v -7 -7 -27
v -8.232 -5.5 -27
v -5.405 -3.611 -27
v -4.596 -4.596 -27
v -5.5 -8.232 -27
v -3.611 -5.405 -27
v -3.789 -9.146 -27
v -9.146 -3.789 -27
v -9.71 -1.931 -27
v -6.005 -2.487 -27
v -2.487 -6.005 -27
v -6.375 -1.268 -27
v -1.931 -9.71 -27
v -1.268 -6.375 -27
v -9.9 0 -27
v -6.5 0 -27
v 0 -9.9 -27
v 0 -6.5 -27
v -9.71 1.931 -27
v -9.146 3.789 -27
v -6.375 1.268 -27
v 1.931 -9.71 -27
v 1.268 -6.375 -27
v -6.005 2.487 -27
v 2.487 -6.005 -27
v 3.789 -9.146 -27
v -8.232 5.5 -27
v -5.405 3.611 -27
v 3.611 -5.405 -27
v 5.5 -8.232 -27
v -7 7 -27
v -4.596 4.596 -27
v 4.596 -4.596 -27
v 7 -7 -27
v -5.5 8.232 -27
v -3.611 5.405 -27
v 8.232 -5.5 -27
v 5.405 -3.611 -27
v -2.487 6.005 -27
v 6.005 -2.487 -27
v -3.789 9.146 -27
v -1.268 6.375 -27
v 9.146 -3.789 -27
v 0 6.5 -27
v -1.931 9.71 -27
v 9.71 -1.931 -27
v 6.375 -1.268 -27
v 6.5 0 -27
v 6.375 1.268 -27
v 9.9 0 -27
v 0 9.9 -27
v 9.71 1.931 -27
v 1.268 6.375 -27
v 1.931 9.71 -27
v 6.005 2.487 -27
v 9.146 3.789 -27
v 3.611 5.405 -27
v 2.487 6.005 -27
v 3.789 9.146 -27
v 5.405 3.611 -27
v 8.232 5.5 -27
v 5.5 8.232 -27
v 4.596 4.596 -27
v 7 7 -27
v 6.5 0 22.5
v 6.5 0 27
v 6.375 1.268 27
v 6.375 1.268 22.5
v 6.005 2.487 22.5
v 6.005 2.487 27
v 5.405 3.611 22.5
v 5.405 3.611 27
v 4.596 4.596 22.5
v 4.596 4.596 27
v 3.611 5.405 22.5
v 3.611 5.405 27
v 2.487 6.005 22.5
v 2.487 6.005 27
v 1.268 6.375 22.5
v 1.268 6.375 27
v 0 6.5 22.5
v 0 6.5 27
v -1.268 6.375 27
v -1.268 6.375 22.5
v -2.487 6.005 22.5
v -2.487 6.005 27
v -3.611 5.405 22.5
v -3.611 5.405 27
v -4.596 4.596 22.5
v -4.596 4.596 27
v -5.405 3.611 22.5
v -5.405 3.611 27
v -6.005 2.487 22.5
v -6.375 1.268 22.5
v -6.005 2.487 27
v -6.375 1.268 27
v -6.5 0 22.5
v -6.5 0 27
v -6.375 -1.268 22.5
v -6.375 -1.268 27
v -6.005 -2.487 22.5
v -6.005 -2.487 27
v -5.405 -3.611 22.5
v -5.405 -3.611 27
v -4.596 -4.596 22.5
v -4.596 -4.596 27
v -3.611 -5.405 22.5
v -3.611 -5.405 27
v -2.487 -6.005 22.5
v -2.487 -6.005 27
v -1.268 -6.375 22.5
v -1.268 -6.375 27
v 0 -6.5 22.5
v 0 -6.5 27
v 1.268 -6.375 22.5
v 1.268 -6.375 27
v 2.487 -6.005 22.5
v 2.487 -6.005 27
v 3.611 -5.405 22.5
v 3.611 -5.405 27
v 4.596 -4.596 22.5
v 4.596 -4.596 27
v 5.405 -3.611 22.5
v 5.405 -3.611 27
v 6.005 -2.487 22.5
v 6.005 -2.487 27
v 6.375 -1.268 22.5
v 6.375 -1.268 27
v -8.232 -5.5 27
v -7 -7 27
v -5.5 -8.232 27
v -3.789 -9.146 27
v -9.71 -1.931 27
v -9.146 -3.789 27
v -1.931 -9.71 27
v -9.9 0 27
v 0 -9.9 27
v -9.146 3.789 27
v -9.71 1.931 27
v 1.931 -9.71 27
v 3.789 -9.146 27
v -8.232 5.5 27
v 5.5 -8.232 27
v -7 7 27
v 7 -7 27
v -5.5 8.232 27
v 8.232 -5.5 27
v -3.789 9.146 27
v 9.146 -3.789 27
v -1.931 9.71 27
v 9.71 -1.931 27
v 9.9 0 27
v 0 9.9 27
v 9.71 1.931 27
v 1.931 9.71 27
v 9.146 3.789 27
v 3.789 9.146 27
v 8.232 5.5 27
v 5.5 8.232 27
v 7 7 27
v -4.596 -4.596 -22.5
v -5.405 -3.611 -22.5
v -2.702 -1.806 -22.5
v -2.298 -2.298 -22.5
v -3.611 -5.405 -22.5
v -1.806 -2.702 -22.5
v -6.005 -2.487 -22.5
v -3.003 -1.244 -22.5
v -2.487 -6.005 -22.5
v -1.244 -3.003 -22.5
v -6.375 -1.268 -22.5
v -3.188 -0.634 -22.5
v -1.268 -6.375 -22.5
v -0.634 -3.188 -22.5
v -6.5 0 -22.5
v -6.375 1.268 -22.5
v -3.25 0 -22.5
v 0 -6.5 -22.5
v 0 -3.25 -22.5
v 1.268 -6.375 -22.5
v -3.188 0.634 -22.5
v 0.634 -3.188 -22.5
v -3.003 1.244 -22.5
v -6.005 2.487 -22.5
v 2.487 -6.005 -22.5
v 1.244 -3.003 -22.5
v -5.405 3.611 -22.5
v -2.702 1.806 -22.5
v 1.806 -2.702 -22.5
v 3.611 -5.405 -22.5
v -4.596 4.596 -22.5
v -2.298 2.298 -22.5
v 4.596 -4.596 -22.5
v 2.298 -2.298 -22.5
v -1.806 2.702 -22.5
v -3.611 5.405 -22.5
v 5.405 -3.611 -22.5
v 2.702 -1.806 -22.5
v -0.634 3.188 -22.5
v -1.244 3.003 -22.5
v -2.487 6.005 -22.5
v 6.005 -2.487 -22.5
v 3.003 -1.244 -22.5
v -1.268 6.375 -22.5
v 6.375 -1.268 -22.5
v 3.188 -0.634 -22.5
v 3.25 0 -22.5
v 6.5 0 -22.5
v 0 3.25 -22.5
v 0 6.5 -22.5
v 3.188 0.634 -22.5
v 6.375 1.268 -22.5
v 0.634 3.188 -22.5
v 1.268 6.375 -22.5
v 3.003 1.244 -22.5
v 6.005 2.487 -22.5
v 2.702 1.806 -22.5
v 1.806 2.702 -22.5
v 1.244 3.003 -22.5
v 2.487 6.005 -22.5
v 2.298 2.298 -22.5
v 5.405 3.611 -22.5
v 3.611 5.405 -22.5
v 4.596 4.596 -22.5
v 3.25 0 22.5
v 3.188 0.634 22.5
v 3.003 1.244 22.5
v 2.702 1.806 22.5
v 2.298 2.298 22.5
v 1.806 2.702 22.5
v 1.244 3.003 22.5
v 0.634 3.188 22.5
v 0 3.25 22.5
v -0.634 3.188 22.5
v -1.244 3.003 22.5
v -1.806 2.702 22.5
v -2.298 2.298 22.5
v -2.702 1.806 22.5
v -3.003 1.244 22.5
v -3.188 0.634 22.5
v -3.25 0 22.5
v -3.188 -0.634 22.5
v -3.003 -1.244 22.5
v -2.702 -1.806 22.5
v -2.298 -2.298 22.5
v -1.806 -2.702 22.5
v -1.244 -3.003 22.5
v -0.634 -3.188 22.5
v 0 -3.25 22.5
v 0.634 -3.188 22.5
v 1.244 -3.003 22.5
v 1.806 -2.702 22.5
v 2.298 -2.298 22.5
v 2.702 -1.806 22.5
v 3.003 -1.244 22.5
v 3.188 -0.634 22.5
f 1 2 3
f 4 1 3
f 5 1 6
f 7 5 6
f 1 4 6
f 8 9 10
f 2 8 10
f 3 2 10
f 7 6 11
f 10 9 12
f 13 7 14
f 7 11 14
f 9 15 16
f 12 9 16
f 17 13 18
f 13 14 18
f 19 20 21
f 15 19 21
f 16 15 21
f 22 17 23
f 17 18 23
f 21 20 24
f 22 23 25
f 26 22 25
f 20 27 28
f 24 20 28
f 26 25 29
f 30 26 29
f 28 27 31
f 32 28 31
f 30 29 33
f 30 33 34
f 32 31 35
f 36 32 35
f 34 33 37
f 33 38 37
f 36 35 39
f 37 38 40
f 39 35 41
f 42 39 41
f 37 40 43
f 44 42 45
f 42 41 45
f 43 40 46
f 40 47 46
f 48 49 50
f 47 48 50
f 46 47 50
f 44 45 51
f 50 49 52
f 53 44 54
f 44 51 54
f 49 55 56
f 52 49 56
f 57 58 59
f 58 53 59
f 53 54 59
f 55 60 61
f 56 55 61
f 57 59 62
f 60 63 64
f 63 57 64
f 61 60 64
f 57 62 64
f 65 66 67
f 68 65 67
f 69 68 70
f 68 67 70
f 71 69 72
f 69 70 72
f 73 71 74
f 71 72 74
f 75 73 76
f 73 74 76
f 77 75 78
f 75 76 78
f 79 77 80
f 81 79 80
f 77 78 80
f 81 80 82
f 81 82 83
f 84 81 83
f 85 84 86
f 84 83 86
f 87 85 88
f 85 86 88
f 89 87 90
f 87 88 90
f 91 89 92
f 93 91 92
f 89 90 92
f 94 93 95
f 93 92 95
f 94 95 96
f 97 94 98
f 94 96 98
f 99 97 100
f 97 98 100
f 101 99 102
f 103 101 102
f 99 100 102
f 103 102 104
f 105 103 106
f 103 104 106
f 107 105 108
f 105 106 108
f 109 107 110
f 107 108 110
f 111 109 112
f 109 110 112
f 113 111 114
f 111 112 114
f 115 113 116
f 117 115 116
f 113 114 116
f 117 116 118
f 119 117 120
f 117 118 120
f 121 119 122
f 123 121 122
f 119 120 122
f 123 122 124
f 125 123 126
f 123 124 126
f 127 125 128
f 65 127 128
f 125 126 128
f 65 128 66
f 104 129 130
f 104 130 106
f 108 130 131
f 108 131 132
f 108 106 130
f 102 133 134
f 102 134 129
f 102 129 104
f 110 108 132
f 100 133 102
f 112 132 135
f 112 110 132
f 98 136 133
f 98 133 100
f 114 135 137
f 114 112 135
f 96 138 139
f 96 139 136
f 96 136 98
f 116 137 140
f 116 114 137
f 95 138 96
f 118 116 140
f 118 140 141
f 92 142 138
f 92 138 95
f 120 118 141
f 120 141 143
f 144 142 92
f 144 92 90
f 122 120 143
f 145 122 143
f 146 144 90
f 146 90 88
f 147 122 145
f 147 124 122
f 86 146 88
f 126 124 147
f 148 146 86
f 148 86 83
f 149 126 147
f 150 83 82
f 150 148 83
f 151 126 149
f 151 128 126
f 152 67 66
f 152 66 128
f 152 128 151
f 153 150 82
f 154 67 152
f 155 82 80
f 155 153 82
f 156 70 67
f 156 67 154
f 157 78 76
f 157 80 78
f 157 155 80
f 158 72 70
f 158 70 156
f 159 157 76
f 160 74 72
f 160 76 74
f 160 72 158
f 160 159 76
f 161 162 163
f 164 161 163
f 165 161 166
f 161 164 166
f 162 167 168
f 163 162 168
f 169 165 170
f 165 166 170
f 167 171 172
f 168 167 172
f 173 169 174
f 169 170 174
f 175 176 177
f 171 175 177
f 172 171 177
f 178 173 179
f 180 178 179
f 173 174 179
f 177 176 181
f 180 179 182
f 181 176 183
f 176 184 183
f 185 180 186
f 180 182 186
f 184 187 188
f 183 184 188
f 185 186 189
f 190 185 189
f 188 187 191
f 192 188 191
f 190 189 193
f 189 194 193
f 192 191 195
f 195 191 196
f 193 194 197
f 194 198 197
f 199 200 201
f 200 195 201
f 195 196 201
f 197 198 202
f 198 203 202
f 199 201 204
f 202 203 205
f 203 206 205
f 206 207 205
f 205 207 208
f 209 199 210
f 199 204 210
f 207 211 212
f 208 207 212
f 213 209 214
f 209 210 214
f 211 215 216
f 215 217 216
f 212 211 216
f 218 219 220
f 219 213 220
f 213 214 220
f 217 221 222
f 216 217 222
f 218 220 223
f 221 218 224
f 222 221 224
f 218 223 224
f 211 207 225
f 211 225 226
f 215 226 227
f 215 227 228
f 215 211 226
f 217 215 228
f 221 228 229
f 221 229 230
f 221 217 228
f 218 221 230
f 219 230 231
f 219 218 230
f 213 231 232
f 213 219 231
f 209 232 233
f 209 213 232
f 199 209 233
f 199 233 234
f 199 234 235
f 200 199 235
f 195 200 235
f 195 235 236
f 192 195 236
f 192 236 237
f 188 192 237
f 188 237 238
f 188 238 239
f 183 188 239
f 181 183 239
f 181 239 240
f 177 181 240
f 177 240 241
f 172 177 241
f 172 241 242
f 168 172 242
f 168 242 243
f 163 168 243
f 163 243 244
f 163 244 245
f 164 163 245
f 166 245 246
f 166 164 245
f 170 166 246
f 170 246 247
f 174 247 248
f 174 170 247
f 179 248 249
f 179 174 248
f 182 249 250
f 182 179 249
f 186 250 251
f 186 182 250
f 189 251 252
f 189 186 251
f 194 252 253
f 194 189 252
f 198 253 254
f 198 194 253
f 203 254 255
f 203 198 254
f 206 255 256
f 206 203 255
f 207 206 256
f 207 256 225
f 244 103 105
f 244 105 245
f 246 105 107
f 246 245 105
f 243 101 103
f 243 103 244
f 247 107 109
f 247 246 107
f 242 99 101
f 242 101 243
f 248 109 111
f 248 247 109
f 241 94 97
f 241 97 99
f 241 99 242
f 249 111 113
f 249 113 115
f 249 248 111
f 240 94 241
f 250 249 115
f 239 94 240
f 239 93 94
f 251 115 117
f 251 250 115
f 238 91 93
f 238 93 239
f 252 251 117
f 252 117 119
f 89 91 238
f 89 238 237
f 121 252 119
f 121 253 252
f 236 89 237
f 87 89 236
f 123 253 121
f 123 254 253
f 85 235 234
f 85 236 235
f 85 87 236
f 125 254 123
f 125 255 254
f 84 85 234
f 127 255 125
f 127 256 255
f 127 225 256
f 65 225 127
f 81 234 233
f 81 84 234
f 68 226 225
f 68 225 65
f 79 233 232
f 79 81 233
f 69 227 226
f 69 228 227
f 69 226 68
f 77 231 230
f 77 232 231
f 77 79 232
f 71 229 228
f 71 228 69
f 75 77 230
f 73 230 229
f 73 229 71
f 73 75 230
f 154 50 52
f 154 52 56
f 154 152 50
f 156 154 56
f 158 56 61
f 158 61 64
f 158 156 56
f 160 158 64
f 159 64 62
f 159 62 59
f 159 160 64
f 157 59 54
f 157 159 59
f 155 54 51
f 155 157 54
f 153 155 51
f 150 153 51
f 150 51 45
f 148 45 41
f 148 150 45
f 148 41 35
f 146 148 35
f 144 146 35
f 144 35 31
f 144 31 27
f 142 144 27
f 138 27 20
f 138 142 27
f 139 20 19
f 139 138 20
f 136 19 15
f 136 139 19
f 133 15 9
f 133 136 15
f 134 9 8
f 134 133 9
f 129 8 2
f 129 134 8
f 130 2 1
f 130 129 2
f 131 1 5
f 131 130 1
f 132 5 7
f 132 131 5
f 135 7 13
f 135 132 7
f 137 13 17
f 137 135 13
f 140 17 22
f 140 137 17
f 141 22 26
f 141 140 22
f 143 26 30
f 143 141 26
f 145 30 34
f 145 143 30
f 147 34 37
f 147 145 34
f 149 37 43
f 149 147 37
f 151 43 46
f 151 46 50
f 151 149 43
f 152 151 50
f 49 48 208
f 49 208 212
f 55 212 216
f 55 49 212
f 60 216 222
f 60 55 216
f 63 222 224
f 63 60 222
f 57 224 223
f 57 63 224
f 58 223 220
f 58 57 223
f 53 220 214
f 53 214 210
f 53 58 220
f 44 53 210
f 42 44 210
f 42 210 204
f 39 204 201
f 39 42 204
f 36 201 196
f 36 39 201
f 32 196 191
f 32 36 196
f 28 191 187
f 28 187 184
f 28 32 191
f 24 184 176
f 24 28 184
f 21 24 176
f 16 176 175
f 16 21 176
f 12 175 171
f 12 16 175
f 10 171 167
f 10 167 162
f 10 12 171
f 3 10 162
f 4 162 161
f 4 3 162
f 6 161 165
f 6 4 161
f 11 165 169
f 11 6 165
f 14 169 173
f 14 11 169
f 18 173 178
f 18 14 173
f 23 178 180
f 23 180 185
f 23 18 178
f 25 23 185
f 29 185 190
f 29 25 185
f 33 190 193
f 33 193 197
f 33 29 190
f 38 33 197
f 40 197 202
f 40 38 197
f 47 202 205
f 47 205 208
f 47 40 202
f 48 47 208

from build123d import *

# Parameters (mm, degrees)
F2_R     = 9.9
F3_DEPTH = 27
F4_R     = 6.5
F5_DEPTH = 4.5
F6_R     = 3.25
F7_DEPTH = 22.501


with BuildPart() as f3:
    # F2 (on Top) → F3 (new body)
    with BuildSketch(Plane.XY):
        Circle(F2_R)
    extrude(amount=F3_DEPTH)

    # F4 (on face) → F5 (cut)
    with BuildSketch(Plane.XY.offset(27)):
        Circle(F4_R)
    extrude(amount=-F5_DEPTH, mode=Mode.SUBTRACT)

    # F6 (on face) → F7 (cut, through all)
    with BuildSketch(Plane.XY.offset(22.5)):
        Circle(F6_R)
    extrude(amount=-F7_DEPTH, mode=Mode.SUBTRACT)

    # F8: F3 across plane


with BuildPart() as f3_1:
    add(f3.part)
    add(f3.part.mirror(Plane.XY))


solid = f3_1.part
